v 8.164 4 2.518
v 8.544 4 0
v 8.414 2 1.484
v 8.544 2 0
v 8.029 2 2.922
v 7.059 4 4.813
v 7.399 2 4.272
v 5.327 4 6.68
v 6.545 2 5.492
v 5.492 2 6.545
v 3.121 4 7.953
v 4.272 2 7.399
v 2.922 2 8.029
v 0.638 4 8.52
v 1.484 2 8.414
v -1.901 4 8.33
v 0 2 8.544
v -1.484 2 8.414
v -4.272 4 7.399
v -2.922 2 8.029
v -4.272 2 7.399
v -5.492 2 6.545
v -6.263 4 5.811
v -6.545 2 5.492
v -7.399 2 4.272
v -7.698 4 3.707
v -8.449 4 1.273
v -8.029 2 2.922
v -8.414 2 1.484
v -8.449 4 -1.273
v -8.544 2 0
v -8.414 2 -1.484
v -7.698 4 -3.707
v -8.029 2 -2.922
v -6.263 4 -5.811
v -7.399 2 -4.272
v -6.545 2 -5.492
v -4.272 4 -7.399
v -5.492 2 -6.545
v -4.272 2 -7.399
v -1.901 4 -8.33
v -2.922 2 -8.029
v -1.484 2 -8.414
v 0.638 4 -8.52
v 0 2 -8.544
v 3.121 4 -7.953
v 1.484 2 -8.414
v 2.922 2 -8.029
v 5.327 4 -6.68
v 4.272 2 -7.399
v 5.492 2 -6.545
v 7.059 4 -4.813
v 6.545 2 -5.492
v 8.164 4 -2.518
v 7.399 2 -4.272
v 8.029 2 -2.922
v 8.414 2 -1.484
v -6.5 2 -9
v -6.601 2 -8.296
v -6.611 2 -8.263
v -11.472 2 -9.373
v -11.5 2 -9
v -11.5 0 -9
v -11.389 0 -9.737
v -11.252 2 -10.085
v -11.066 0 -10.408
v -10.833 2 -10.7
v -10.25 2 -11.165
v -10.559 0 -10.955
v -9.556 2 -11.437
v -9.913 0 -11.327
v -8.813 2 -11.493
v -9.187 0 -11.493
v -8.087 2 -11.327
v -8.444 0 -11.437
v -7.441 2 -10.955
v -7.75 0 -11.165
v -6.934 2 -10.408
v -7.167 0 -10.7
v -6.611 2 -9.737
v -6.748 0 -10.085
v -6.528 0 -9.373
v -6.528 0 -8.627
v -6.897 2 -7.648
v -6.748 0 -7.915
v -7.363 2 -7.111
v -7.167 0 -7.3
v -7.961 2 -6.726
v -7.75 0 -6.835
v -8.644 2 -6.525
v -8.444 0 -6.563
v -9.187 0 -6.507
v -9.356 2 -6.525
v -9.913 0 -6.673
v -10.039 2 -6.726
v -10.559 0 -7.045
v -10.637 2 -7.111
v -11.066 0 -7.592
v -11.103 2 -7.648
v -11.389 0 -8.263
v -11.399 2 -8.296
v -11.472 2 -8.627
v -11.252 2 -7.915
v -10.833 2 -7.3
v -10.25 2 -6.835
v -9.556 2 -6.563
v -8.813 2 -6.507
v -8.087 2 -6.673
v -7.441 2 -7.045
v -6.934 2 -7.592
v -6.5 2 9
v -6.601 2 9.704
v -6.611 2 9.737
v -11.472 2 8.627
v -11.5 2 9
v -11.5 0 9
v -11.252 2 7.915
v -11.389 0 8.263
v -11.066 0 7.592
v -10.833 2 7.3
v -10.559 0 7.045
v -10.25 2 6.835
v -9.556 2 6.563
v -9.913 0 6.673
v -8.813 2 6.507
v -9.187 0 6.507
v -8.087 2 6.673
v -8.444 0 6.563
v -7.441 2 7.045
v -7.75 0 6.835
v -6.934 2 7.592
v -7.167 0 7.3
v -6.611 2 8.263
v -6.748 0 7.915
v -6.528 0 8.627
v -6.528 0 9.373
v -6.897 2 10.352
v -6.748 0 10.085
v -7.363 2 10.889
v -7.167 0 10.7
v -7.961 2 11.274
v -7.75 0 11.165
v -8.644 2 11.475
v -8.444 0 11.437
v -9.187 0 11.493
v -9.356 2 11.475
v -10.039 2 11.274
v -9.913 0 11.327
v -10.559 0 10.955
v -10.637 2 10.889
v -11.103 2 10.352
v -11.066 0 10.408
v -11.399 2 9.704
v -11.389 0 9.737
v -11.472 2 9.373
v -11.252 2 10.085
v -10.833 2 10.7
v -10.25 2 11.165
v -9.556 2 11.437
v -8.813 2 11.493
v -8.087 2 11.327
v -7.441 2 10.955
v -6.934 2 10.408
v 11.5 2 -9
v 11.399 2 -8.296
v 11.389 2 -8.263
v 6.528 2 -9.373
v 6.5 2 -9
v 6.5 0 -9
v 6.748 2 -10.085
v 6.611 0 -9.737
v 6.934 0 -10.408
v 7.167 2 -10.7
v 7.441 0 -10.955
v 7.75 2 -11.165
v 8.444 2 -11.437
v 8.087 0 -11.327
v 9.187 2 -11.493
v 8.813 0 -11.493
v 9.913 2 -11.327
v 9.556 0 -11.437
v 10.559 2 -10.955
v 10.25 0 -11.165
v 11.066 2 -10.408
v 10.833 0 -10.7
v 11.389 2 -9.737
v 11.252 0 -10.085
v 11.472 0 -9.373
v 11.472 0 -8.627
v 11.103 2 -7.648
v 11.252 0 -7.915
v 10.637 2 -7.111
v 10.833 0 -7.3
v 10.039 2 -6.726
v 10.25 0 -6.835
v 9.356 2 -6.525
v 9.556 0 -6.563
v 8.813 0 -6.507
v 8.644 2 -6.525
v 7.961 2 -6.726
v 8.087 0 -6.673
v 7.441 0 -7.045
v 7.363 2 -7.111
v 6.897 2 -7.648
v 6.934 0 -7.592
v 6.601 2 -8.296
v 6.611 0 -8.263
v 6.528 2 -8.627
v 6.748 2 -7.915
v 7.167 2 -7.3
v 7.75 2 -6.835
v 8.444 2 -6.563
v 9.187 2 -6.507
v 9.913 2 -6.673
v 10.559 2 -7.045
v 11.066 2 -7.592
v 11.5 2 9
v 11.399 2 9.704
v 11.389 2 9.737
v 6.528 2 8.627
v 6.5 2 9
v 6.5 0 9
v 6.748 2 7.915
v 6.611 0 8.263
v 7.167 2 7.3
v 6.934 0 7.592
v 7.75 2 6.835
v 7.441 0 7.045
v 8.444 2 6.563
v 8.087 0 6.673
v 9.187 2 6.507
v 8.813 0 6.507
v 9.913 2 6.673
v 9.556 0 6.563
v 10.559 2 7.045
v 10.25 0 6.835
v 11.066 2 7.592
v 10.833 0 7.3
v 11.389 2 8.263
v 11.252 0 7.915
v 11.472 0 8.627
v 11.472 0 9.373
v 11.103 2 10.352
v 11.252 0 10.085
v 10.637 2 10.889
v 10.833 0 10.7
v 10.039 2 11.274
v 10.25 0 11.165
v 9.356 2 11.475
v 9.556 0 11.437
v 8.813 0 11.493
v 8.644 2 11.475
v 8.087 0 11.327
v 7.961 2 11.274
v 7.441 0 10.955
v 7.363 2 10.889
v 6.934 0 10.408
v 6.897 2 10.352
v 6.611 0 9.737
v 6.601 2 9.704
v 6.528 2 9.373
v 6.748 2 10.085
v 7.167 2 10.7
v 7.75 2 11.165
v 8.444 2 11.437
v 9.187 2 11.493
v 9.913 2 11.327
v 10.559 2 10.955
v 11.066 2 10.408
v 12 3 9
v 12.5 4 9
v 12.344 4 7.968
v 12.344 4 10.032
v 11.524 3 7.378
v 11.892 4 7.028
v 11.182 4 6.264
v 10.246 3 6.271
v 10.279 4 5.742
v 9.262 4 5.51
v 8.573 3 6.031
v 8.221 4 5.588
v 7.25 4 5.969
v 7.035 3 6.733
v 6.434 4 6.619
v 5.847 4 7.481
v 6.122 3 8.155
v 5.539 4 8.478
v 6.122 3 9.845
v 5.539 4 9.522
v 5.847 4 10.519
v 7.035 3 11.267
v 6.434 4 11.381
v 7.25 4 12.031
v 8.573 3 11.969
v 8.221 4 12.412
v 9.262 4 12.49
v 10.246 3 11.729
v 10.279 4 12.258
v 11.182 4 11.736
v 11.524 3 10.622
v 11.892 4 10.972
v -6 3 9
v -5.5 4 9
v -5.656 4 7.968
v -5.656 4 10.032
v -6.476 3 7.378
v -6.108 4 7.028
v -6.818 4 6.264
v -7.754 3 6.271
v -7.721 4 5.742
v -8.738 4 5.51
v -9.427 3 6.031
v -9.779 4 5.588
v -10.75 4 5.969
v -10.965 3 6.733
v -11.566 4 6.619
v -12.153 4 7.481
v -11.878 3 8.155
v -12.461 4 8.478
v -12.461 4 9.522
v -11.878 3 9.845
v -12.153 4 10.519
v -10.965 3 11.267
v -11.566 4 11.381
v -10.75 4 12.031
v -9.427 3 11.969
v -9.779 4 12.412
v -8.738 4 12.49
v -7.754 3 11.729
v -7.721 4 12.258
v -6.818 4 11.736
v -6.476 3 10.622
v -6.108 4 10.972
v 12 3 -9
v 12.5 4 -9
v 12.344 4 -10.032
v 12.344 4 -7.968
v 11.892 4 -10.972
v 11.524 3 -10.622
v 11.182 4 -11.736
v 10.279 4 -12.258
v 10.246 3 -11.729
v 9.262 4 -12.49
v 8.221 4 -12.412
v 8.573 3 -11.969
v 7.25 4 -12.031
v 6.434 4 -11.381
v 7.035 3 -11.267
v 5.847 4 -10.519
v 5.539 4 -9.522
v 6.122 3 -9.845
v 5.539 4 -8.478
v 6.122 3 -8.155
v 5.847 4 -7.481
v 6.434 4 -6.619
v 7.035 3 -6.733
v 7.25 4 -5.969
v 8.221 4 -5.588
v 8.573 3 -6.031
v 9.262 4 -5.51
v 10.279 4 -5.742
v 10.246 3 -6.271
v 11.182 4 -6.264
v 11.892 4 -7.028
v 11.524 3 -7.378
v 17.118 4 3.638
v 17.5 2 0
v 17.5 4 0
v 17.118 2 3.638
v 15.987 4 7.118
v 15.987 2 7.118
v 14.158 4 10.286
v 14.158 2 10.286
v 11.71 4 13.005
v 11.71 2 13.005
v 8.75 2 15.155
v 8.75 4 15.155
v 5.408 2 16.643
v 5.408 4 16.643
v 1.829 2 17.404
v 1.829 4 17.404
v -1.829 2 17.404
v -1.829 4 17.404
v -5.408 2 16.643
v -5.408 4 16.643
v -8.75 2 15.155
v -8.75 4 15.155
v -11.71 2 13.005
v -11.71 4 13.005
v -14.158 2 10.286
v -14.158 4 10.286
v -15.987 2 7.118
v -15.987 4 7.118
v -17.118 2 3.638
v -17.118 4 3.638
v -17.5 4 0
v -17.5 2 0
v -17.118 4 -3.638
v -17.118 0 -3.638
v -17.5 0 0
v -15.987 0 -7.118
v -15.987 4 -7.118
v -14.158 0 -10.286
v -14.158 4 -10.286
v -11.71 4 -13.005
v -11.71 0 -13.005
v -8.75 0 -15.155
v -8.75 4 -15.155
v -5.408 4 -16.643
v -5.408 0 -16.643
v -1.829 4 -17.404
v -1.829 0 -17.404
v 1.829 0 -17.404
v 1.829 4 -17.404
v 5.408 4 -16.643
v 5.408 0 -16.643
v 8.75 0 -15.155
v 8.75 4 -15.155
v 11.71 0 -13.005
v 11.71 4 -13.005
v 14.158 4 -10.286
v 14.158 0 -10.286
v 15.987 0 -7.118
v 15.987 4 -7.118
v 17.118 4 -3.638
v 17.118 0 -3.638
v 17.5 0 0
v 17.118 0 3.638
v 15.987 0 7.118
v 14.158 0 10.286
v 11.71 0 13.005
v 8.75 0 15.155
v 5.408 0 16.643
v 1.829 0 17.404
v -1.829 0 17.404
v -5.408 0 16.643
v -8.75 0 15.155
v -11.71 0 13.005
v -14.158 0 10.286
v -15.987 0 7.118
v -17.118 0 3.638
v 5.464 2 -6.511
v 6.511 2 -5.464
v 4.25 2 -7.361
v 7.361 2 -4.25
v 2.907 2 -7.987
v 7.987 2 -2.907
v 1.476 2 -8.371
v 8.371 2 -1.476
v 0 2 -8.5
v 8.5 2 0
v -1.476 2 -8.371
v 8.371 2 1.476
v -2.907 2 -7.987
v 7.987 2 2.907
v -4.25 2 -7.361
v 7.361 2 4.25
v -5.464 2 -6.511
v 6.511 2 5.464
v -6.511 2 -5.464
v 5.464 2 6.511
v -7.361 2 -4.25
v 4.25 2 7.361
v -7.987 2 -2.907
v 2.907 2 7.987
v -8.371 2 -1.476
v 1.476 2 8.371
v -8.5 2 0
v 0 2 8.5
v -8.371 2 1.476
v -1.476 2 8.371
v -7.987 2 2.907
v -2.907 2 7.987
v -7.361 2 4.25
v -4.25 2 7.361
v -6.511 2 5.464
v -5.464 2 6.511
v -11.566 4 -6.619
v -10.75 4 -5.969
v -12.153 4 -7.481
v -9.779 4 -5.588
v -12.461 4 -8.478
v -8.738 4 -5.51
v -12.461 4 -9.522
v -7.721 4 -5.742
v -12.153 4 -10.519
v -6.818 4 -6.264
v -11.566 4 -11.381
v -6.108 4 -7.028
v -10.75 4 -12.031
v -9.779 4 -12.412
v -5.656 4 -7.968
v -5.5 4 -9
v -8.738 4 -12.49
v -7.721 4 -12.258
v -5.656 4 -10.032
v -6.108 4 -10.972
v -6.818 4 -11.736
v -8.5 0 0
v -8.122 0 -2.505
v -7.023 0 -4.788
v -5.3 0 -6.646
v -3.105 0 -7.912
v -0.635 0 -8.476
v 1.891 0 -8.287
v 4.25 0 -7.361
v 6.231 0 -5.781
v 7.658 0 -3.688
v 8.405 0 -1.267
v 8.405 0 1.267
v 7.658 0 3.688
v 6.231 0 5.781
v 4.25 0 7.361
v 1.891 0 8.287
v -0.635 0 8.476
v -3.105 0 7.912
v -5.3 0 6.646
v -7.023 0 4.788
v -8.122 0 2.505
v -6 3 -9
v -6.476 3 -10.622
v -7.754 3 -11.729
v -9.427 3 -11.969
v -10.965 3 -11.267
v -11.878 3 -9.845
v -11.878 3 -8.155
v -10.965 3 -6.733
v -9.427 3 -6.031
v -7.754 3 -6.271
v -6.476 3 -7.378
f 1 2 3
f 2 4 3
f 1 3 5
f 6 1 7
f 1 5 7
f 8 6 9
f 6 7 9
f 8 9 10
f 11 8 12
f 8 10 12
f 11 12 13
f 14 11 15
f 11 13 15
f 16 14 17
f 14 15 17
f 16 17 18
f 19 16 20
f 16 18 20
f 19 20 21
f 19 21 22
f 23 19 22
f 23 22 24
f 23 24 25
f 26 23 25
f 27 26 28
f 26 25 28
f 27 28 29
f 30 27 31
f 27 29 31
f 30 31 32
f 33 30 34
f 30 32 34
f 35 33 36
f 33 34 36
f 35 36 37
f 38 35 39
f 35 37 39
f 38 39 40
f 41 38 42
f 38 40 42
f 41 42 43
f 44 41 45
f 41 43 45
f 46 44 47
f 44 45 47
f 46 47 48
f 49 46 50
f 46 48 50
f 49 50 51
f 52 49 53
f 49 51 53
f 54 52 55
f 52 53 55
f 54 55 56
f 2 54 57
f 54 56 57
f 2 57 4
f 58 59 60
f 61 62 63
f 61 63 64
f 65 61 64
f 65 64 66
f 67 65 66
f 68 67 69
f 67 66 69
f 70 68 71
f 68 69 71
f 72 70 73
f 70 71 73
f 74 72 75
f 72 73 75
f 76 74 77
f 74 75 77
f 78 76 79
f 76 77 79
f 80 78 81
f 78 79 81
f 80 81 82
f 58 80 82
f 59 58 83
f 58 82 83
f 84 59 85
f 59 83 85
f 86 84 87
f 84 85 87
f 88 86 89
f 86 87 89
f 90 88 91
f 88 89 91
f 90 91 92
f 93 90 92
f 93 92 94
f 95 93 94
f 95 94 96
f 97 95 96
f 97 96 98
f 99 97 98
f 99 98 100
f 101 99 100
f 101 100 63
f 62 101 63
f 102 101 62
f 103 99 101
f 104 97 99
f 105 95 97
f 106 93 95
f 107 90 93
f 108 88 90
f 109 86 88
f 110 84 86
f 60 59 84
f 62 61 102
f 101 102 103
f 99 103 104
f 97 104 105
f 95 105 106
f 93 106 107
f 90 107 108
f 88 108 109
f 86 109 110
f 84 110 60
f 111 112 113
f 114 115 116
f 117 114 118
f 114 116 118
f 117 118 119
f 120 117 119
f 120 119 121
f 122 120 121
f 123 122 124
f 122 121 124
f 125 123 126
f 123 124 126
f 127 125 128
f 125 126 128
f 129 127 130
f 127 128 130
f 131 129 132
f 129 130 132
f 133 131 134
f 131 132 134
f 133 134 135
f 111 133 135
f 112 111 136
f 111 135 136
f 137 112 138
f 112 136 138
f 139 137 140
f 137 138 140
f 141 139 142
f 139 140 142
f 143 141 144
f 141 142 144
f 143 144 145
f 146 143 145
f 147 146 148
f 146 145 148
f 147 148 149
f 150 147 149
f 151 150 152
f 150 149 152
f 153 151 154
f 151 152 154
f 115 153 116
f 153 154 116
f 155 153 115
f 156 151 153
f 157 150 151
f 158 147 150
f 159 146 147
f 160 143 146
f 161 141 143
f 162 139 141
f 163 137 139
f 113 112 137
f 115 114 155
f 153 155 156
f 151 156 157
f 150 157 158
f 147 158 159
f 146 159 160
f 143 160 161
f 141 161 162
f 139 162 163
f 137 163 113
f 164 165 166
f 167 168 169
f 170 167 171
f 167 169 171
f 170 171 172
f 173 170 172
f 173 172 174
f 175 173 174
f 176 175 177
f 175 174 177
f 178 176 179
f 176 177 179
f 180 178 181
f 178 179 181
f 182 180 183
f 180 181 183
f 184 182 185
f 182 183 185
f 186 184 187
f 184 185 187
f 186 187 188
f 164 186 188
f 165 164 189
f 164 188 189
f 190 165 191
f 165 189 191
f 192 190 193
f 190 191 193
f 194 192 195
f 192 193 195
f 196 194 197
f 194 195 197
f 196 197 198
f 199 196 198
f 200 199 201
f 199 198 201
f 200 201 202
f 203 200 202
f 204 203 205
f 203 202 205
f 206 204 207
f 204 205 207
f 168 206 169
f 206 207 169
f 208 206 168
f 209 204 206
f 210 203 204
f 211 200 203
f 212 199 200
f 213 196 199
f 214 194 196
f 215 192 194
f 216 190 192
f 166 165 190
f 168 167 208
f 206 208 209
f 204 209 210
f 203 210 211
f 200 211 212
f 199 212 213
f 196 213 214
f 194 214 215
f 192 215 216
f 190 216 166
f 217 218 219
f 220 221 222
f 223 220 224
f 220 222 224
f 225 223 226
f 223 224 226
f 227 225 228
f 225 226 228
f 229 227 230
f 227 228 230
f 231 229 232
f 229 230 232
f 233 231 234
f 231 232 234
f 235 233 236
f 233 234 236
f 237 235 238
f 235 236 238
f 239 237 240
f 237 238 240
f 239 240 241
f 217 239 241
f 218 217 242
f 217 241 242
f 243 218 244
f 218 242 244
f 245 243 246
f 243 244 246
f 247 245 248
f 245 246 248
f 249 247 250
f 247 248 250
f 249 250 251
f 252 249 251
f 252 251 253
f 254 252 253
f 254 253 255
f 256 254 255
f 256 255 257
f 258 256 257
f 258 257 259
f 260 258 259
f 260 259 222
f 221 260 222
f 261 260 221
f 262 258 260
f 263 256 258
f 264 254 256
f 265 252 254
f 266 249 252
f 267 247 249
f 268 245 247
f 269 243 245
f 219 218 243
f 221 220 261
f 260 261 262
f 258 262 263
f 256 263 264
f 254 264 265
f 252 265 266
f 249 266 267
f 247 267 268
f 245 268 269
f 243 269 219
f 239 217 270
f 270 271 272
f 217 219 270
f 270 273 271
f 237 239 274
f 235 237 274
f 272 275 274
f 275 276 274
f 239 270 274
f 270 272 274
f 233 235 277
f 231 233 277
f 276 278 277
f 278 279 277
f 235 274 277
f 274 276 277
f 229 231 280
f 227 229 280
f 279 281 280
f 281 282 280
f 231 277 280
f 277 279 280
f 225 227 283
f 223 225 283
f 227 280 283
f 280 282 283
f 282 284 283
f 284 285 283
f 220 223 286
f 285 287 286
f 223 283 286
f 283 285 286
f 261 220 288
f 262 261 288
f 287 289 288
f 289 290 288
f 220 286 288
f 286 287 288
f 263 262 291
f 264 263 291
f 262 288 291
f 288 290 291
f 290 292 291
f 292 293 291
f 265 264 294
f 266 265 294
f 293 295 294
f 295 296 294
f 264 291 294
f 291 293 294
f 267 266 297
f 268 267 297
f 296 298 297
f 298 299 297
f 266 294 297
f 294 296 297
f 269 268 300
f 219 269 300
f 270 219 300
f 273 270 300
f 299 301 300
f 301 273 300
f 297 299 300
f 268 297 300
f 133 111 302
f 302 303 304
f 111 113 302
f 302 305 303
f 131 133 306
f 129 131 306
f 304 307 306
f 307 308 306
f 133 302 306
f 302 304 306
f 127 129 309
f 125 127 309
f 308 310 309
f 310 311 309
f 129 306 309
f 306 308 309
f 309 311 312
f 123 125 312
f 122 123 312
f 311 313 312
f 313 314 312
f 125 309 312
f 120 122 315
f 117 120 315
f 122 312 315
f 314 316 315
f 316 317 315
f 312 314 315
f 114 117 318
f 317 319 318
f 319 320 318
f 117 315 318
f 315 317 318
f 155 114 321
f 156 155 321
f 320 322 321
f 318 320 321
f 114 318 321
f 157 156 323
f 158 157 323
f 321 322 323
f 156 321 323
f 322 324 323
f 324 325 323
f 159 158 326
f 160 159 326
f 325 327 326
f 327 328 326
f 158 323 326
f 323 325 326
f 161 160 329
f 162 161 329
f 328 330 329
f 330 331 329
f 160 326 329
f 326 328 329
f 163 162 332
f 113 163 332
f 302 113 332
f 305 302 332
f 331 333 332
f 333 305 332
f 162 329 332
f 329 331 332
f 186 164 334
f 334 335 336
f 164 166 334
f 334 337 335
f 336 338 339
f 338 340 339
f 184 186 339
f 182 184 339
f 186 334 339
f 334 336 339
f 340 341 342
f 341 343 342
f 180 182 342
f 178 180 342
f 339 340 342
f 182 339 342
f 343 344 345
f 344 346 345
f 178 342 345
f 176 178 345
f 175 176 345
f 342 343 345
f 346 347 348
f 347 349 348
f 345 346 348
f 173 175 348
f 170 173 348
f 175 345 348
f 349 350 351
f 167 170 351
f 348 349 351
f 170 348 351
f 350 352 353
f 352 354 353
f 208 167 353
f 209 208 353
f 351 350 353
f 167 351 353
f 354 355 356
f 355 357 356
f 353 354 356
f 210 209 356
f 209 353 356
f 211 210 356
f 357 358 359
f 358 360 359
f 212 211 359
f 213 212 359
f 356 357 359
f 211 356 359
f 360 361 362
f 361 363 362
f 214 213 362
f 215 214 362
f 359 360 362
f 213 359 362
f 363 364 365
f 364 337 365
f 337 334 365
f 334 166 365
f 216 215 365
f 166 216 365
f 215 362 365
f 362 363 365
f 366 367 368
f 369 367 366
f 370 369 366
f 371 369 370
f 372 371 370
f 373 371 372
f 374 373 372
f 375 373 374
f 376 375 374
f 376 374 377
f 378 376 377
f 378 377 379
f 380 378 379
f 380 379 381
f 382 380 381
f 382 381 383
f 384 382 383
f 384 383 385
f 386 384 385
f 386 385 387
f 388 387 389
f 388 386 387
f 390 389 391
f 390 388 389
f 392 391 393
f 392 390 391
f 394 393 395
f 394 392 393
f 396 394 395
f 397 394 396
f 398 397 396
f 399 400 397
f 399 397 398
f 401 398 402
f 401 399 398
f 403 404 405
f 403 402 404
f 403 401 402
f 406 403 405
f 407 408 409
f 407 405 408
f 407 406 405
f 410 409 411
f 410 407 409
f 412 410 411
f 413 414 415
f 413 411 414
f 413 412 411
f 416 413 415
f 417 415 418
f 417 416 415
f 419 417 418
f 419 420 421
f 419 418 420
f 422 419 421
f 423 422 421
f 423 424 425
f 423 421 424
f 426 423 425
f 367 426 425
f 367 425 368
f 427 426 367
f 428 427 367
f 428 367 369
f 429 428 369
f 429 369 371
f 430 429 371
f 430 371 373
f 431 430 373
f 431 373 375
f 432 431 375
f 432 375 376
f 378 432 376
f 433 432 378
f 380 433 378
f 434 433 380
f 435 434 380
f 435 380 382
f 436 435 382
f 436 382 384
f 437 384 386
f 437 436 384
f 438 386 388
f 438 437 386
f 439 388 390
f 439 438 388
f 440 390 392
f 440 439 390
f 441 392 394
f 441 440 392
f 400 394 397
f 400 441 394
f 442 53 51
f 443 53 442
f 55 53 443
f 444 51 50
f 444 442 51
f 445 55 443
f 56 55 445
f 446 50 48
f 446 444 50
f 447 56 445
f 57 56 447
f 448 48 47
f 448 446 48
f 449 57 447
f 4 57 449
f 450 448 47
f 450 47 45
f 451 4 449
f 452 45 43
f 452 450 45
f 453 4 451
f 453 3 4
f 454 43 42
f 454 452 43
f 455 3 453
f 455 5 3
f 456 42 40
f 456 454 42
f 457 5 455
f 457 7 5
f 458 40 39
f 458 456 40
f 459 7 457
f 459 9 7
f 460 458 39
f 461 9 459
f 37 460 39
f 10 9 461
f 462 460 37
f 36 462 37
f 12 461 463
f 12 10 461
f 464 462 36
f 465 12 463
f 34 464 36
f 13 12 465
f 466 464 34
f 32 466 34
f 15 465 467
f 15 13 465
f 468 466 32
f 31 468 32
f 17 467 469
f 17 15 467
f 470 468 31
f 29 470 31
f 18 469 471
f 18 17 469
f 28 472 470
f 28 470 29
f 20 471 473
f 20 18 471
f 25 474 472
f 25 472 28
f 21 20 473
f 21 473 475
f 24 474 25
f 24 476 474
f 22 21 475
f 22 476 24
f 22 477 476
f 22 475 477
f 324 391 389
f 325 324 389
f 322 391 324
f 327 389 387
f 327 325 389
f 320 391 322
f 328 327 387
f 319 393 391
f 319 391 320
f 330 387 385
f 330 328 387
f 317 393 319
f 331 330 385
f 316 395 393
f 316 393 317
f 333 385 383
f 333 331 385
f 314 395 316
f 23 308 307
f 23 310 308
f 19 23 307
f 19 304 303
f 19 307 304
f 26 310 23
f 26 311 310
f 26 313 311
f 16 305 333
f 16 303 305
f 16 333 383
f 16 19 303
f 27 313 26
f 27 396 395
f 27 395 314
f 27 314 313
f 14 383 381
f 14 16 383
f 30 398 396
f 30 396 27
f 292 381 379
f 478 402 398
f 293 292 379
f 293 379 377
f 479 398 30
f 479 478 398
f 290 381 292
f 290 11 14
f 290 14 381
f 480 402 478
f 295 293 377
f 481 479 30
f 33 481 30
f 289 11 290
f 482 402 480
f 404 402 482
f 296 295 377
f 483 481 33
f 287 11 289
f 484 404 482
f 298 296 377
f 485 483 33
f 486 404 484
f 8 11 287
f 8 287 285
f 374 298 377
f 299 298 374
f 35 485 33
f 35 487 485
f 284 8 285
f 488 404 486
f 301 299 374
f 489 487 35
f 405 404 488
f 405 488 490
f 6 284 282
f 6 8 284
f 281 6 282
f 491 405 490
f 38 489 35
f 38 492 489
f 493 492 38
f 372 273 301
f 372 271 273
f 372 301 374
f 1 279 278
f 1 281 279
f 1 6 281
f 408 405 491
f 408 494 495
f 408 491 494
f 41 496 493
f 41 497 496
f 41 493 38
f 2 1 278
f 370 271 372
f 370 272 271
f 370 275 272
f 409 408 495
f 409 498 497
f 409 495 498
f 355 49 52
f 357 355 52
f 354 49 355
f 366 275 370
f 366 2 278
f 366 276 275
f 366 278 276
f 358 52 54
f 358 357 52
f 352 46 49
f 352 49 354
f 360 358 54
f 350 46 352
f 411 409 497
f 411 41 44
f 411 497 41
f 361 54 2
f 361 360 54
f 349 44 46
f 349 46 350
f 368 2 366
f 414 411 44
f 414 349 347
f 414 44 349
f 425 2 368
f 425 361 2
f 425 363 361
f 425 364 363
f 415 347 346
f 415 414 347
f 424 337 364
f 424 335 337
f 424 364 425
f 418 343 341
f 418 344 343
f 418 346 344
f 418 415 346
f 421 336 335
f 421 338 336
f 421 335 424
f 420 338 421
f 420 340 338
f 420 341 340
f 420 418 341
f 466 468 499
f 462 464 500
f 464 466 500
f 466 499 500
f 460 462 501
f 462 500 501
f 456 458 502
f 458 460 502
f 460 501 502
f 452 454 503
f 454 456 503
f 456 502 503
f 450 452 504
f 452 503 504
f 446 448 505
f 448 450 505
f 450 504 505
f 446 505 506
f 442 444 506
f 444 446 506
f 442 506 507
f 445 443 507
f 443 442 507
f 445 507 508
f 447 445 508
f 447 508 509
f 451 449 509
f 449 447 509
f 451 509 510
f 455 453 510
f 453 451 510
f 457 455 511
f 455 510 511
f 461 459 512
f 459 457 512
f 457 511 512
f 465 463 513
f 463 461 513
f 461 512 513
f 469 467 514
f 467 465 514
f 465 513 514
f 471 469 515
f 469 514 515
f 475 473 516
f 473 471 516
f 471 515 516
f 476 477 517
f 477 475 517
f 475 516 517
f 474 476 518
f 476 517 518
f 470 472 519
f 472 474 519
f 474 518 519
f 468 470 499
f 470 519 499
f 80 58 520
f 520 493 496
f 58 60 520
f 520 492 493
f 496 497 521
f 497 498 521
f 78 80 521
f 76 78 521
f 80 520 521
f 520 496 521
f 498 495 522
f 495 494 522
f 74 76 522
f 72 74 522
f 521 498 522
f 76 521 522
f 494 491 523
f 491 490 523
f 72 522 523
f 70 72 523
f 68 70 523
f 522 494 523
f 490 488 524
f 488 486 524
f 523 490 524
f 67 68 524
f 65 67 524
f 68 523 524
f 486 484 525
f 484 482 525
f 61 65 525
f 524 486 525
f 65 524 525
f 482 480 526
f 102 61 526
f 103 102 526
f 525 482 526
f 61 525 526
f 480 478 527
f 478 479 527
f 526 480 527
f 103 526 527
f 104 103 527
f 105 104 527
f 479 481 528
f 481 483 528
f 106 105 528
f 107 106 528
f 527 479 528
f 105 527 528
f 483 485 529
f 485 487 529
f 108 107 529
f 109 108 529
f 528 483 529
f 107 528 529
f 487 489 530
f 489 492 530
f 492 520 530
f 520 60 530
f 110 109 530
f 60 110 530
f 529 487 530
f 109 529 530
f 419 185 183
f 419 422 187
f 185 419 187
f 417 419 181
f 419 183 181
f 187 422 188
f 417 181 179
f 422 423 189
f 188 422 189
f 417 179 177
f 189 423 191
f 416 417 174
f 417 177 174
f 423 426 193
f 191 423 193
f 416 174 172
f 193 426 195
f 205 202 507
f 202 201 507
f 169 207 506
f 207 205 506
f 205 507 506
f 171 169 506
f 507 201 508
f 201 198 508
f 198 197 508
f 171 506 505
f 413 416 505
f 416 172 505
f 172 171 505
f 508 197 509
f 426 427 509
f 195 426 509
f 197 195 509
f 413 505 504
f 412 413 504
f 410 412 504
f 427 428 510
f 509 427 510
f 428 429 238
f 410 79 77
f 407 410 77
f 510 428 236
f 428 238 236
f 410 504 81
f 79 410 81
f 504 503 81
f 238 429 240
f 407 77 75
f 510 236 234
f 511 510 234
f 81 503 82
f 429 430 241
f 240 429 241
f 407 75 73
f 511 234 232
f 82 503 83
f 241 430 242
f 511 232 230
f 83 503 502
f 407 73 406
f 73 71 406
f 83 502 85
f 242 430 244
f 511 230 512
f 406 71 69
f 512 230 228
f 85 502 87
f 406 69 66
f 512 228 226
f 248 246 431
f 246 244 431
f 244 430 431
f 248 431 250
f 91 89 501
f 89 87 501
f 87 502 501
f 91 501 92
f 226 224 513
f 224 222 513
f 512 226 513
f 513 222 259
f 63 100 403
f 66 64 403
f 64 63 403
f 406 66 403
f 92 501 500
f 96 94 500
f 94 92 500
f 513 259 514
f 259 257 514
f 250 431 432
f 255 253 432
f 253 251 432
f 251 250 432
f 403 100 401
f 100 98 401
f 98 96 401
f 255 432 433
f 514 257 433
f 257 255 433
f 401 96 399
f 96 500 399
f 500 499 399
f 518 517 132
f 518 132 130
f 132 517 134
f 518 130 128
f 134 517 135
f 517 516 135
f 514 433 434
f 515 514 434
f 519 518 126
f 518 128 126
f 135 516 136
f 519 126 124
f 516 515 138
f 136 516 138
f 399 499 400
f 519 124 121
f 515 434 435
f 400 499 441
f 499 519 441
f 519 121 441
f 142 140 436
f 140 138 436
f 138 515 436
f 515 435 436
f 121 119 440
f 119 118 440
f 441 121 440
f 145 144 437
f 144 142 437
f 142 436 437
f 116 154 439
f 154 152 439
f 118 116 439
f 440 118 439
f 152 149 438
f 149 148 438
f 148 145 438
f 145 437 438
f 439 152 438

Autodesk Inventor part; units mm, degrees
ref_plane "YZ Plane" through (0, 0, 0) normal (1, 0, 0) x (0, 1, 0)
ref_plane "XZ Plane" through (0, 0, 0) normal (0, 1, 0) x (-1, 0, 0)
ref_plane "XY Plane" through (0, 0, 0) normal (0, 0, 1) x (1, 0, 0)
sketch "Esquisse3" plane through (0, 0, 0) normal (0, 1, 0) x (-1, 0, 0)
  line L0 (-6.5, 6.5) -> (6.5, 6.5) construction
  line L1 (6.5, 6.5) -> (6.5, -6.5) construction
  line L2 (6.5, -6.5) -> (-6.5, -6.5) construction
  line L3 (-6.5, -6.5) -> (-6.5, 6.5) construction
  line L4 (-6.5, 6.5) -> (6.5, -6.5) construction
  line L5 (6.5, 6.5) -> (-6.5, -6.5) construction
  line L6 (-11.5, 11.5) -> (11.5, 11.5) construction
  line L7 (11.5, 11.5) -> (11.5, -11.5) construction
  line L8 (11.5, -11.5) -> (-11.5, -11.5) construction
  line L9 (-11.5, -11.5) -> (-11.5, 11.5) construction
  line L10 (-11.5, 11.5) -> (11.5, -11.5) construction
  line L11 (11.5, 11.5) -> (-11.5, -11.5) construction
  line L12 (-6.5, 6.5) -> (-11.5, 6.5) construction
  line L13 (-11.5, 6.5) -> (-11.5, 11.5) construction
  line L14 (-11.5, 11.5) -> (-6.5, 11.5) construction
  line L15 (-6.5, 11.5) -> (-6.5, 6.5) construction
  line L16 (-6.5, -6.5) -> (-11.5, -6.5) construction
  line L17 (-11.5, -6.5) -> (-11.5, -11.5) construction
  line L18 (-11.5, -11.5) -> (-6.5, -11.5) construction
  line L19 (-6.5, -11.5) -> (-6.5, -6.5) construction
  line L20 (6.5, -6.5) -> (11.5, -6.5) construction
  line L21 (11.5, -6.5) -> (11.5, -11.5) construction
  line L22 (11.5, -11.5) -> (6.5, -11.5) construction
  line L23 (6.5, -11.5) -> (6.5, -6.5) construction
  line L24 (11.5, 11.5) -> (6.5, 11.5) construction
  line L25 (6.5, 11.5) -> (6.5, 6.5) construction
  line L26 (6.5, 6.5) -> (11.5, 6.5) construction
  line L27 (11.5, 6.5) -> (11.5, 11.5) construction
  circle A0 centre (9, 9) radius 2.5
  circle A1 centre (9, -9) radius 2.5
  circle A2 centre (-9, -9) radius 2.5
  circle A3 centre (-9, 9) radius 2.5
  circle A4 centre (0, 0) radius 17.5
  circle A5 centre (0, 0) radius 8.5
  dimension "d1" = 13
  dimension "d2" = 13
  dimension "d3" = 5
  dimension "d4" = 35
  dimension "d9" = 9
extrude "Extrusion1" add sketch "Esquisse3" along normal blind 2
sketch "Esquisse4" plane through (0, 2, 0) normal (0, 1, 0) x (1, 0, 0)
  circle A0 centre (-9, 9) radius 3.5
  circle A1 centre (-9, 9) radius 2.5 projected
  circle A2 centre (9, 9) radius 3.5
  circle A3 centre (9, -9) radius 3.5
  circle A4 centre (-9, -9) radius 3.5
  circle A5 centre (9, 9) radius 2.5 projected
  circle A6 centre (9, -9) radius 2.5 projected
  circle A7 centre (-9, -9) radius 2.5 projected
  circle A8 centre (0, 0) radius 17.5
  circle A9 centre (0, 0) radius 8.544
  circle A10 centre (9, 9) radius 2.5 projected
  circle A11 centre (9, 9) radius 2.5
  circle A12 centre (9, -9) radius 2.5
  circle A13 centre (-9, -9) radius 2.5
  dimension "d10" = 7
  dimension "d11" = 7
  dimension "d12" = 7
  dimension "d13" = 7
extrude "Extrusion2" add sketch "Esquisse4" along normal blind 2 contours A0 | A2 | A3 | A4 | A8
chamfer "Chanfrein1" distance 1 distance2 2 1 edges at (-11.5, 4, -9) measured on face at (3.3085, 4, 12.0053)
chamfer "Chanfrein2" distance 1 distance2 2 1 edges at (6.5, 4, -9) measured on face at (3.3085, 4, 12.0053)
chamfer "Chanfrein3" distance 1 distance2 2 1 edges at (-11.5, 4, 9) measured on face at (3.3085, 4, 12.0053)
chamfer "Chanfrein4" distance 1 distance2 2 1 edges at (6.5, 4, 9) measured on face at (3.3085, 4, 12.0053)
properties part number "Pièce_moteur_maintient_test_2"
